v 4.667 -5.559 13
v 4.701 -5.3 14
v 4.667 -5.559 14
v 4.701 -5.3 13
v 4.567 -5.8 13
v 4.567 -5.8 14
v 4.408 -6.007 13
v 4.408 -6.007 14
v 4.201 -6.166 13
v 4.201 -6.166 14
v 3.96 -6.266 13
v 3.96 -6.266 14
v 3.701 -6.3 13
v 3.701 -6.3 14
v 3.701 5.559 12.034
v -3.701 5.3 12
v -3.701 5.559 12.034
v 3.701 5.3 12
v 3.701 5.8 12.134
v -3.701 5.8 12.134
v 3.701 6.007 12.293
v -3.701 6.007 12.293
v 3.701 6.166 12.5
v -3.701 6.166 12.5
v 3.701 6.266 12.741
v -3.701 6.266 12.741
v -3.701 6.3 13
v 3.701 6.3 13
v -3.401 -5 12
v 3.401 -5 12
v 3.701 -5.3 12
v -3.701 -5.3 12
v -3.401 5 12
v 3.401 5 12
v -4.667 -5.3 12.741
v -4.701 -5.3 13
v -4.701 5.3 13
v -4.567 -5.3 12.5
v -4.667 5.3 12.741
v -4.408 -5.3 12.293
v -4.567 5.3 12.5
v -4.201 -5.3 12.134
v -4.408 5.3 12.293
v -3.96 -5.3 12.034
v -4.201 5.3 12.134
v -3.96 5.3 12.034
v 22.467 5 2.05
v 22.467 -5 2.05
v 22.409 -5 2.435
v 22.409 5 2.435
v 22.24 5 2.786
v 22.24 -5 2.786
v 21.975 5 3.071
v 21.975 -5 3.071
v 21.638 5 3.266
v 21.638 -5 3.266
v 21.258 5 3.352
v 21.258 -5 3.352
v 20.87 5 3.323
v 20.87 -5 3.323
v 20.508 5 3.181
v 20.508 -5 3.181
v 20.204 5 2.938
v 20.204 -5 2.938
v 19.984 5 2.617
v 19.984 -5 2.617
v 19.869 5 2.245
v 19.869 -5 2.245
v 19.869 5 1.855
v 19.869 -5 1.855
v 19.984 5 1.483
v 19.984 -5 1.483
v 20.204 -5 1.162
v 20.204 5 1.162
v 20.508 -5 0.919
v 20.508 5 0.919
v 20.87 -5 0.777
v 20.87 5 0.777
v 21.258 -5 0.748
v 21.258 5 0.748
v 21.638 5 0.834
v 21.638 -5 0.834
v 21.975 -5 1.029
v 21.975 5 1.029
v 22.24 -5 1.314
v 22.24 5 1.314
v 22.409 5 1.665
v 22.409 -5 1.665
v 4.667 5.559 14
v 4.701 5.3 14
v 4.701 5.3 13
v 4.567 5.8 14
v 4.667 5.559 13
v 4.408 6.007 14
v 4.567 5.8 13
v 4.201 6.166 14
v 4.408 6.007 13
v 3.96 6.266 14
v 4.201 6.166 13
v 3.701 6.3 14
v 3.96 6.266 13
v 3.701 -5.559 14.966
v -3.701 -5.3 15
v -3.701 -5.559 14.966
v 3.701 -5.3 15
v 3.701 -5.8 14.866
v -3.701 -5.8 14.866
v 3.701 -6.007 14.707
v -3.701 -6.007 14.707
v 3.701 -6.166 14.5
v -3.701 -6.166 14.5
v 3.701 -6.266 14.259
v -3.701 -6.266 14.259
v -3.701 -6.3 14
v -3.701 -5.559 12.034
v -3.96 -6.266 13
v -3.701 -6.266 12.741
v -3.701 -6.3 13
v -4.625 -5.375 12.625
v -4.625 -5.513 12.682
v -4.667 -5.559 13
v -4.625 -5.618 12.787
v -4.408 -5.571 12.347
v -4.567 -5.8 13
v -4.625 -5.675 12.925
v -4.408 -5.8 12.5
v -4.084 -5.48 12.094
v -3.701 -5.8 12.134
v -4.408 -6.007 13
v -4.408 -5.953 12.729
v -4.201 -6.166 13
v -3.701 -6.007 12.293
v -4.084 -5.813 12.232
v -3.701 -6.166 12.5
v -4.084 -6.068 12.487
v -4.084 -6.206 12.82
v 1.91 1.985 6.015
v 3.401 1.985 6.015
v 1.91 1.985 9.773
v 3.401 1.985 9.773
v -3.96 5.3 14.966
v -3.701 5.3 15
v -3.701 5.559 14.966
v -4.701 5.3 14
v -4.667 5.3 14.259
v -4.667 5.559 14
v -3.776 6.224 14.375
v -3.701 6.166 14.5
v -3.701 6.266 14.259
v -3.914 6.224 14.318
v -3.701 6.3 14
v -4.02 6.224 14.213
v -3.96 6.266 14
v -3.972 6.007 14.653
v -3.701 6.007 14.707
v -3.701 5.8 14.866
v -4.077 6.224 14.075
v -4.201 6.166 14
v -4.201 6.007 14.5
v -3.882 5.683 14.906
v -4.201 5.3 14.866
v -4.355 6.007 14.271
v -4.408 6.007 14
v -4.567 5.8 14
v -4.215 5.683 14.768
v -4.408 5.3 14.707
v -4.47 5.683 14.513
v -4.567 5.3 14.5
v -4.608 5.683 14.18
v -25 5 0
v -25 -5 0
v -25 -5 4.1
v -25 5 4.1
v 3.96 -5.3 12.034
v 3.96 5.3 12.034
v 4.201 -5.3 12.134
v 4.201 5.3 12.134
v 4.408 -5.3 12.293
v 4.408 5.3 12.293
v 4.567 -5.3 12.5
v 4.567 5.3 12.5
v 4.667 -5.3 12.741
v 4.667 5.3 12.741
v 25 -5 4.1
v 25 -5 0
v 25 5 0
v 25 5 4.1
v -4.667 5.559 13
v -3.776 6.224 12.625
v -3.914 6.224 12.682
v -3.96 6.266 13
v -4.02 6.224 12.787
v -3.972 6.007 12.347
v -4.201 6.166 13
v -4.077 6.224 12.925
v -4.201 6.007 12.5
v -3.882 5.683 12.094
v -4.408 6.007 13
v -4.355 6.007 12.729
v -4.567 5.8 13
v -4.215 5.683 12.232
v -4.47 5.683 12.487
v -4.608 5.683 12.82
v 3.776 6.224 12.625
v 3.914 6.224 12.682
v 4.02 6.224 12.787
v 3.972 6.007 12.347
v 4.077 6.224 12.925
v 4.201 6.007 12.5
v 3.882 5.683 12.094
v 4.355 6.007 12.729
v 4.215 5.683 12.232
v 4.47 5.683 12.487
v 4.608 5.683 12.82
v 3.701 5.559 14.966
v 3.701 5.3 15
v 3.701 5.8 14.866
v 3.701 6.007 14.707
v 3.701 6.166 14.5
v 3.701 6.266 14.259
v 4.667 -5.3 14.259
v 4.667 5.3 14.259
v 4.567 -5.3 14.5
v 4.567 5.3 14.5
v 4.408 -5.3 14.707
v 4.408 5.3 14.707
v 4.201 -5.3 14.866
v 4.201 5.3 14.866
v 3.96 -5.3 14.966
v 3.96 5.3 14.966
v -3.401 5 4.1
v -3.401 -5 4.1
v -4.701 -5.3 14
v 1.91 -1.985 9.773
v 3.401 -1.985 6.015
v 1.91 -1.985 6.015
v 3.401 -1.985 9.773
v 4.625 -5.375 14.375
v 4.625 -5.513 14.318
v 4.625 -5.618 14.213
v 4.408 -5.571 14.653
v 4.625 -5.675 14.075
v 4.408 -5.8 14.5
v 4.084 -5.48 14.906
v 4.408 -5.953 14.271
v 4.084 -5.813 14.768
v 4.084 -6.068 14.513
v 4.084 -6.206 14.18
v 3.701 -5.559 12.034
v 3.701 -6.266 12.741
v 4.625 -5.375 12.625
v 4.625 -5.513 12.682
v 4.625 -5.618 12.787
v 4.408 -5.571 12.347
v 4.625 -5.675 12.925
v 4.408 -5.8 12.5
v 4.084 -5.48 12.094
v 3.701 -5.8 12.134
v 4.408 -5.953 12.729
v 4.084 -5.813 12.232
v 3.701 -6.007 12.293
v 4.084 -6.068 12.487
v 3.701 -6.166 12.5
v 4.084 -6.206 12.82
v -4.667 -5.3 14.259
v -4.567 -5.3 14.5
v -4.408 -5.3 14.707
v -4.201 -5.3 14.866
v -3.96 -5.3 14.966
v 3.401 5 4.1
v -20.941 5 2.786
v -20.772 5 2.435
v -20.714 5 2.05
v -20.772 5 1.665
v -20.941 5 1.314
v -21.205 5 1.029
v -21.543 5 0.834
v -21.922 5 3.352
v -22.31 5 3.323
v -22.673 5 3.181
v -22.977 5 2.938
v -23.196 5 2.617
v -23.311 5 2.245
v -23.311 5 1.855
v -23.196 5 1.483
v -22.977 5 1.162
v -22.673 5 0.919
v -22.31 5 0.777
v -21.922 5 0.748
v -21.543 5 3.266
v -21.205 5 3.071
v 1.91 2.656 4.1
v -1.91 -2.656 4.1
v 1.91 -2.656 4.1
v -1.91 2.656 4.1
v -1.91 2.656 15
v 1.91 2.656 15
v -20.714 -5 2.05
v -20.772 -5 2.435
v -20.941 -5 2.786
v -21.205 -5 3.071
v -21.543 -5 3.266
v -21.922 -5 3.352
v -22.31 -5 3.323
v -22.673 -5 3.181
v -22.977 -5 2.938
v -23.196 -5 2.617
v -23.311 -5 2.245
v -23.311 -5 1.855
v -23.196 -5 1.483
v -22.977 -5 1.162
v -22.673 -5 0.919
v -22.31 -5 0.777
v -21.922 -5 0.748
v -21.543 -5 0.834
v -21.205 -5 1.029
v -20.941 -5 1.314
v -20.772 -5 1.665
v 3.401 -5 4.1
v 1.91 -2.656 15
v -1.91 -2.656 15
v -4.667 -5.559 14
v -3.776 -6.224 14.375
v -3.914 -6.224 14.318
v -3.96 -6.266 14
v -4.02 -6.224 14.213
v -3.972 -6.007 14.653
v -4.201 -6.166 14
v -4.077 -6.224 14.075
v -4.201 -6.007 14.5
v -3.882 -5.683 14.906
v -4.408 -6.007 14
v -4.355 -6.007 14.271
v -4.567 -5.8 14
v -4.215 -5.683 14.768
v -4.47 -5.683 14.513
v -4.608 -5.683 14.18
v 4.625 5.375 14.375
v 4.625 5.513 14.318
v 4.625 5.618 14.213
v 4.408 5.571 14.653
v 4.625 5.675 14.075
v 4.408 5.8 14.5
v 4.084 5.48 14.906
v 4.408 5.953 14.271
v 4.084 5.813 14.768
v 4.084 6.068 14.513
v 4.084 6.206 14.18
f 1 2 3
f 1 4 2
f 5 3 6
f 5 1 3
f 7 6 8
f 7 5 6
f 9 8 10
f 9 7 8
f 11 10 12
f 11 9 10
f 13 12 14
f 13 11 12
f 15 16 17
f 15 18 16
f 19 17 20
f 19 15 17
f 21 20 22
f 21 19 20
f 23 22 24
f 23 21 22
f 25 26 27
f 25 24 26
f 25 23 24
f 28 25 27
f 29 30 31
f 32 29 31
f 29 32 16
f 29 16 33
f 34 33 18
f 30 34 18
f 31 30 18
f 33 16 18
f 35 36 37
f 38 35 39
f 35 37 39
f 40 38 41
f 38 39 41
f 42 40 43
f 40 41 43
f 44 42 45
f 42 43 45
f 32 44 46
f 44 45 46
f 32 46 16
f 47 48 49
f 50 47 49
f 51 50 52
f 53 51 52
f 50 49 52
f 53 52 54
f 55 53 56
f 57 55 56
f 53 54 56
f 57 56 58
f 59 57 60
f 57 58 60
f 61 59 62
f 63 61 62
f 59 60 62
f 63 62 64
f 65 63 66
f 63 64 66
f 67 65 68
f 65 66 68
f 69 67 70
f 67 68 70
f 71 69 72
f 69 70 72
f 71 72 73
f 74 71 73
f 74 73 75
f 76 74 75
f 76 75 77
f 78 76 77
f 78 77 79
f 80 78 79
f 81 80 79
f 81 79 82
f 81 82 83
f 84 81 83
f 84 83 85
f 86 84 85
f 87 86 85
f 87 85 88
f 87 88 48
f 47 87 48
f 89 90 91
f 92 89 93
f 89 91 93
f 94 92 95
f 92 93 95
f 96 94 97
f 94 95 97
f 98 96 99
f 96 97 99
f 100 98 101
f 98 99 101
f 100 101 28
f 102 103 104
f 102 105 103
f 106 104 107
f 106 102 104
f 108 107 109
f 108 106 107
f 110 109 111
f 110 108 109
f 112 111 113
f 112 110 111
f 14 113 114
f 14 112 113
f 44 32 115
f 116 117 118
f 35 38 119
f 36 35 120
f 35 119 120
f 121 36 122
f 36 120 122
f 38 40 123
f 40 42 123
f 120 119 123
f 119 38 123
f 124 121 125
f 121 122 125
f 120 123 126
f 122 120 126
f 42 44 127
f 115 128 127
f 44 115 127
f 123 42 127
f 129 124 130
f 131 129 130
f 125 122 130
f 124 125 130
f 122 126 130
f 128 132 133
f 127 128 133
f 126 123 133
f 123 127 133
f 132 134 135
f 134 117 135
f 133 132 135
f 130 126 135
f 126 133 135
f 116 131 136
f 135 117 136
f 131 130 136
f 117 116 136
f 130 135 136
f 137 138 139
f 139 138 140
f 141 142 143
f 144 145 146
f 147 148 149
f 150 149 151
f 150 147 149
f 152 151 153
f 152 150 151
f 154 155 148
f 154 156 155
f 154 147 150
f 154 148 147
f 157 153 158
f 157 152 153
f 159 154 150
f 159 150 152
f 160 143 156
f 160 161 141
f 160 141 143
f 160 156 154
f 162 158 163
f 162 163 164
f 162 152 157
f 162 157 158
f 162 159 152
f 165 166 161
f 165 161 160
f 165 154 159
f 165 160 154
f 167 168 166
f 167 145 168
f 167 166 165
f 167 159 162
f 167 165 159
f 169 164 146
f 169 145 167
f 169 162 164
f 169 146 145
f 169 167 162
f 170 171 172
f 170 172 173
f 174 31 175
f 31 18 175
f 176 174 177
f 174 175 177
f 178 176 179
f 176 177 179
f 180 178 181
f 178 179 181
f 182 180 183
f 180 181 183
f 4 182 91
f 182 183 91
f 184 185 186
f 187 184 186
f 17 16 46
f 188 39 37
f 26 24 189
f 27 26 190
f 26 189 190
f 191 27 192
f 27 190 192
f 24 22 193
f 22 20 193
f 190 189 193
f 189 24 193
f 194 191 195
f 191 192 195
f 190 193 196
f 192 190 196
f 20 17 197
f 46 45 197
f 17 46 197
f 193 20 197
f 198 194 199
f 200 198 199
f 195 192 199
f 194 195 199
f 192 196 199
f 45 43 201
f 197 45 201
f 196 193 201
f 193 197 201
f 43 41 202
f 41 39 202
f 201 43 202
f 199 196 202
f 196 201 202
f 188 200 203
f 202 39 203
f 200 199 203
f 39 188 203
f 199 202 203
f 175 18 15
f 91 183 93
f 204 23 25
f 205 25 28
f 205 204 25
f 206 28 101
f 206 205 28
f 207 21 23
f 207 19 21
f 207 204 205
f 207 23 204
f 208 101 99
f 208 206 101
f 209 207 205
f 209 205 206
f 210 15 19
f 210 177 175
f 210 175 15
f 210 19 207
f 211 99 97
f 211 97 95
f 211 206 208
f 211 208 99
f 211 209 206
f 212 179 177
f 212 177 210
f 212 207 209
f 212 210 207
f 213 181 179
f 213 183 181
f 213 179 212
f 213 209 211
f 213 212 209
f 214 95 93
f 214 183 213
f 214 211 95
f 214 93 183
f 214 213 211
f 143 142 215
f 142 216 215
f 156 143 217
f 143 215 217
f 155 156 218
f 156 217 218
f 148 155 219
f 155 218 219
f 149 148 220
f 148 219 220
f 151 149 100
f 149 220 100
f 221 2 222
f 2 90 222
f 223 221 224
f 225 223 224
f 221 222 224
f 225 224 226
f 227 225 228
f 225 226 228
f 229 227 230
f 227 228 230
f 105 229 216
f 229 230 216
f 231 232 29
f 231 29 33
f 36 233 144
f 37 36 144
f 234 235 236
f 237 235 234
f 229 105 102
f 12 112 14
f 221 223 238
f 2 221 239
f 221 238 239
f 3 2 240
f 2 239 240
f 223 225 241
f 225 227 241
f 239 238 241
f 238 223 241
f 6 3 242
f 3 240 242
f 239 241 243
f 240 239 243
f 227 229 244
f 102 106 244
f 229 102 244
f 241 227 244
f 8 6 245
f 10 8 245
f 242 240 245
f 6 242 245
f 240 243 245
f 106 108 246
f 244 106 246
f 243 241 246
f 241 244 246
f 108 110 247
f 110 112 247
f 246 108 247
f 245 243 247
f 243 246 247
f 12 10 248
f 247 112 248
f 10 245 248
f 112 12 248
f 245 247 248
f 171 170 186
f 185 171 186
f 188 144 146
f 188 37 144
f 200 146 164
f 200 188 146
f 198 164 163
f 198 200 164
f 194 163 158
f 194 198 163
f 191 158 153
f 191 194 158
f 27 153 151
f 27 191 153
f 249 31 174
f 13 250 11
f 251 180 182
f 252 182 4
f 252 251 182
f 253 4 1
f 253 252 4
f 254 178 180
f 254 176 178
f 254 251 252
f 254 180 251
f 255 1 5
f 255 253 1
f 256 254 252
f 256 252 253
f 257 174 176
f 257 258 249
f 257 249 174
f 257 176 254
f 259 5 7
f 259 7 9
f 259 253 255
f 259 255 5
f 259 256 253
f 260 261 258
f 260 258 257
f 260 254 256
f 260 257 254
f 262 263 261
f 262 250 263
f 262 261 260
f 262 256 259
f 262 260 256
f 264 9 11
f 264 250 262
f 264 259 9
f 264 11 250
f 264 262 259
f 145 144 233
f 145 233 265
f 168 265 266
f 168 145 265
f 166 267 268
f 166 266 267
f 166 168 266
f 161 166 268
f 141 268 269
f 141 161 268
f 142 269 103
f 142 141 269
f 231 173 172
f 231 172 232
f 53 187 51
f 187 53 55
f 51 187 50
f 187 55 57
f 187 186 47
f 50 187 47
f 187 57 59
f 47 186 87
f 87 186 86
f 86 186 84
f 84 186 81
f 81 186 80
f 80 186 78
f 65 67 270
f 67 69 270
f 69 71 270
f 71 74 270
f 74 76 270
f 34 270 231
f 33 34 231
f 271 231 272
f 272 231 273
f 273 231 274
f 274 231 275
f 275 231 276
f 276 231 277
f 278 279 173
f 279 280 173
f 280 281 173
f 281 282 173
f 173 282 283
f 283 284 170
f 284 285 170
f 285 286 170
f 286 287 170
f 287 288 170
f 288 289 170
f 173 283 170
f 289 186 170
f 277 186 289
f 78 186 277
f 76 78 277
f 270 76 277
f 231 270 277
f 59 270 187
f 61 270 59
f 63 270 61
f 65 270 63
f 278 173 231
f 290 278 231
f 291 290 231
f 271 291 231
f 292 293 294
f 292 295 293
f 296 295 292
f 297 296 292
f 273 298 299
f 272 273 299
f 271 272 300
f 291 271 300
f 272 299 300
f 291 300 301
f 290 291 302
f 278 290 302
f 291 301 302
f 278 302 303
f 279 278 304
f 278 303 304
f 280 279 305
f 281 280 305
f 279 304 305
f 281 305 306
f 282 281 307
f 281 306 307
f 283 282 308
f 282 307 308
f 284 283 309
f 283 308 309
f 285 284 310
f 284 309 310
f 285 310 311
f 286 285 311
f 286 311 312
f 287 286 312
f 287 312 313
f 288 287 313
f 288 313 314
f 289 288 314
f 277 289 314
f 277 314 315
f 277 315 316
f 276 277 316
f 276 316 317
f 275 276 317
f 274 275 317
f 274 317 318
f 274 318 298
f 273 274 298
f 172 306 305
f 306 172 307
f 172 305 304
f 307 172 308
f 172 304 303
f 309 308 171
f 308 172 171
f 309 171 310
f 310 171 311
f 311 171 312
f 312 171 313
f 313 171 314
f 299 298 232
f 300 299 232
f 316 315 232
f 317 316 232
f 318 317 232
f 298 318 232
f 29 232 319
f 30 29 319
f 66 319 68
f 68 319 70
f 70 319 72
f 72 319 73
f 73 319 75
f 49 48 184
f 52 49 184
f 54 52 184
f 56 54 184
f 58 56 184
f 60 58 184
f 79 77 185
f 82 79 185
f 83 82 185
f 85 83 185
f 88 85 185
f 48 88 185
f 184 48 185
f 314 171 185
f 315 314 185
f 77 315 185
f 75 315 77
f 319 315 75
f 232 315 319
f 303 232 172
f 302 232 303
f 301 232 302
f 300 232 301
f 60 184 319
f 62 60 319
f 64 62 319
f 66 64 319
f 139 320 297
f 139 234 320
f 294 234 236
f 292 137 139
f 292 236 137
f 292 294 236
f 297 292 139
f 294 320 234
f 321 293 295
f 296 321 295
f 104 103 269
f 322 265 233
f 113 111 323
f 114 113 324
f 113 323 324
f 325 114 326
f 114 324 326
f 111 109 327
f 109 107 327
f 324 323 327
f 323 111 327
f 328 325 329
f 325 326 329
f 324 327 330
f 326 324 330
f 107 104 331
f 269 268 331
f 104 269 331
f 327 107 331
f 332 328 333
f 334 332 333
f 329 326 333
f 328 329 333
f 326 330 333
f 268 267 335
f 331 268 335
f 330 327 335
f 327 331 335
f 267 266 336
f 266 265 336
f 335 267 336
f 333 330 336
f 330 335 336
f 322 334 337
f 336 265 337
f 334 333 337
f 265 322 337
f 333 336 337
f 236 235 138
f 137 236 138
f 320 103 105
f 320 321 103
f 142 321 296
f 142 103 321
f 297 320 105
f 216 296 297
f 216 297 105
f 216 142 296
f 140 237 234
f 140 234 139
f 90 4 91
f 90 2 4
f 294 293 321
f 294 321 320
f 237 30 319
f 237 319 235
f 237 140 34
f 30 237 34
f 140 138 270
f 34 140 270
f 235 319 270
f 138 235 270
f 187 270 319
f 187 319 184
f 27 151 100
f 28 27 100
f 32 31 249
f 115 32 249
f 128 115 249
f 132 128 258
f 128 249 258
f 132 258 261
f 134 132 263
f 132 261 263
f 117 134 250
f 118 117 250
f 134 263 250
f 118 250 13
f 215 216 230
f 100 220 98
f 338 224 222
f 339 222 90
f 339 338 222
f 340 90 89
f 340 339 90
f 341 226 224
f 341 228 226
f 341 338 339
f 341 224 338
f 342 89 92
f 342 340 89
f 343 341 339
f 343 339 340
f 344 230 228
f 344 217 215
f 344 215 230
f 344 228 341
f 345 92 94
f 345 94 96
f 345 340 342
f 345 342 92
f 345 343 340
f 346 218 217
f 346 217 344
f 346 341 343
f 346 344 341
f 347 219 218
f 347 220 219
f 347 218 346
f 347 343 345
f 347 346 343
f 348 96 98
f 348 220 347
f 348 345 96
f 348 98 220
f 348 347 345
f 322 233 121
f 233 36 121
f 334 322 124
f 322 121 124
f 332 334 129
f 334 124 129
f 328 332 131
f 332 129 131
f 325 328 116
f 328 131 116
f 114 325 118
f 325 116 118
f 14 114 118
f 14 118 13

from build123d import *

# Parameters (mm, degrees)
F0_W     = 21.598608559
F0_H     = 10
F0_W_2   = 6.802782882
F0_W_3   = 3.8192358334
F0_H_2   = 5.3111389279
F1_DEPTH = 4.1
F2_DEPTH = 15
F3_W     = 3.9702160284
F3_H     = 3.7578037009
F4_DEPTH = 1.4917735243
F5_R     = 1.3059385841
F6_DEPTH = 10.001
F7_W     = 9.4027826563
F7_H     = 12.5999997742
F7_W_2   = 6.802782882
F7_H_2   = 10
F7_W_3   = 3.8192358334
F7_H_3   = 5.3111389279
F8_DEPTH = 3
F9_R     = 1


with BuildPart() as f1:
    # F0 (on Top) → F1 (new body)
    with BuildSketch(Plane.XY):
        with Locations((-14.2006957205, 0)):
            Rectangle(F0_W, F0_H)
        with Locations((14.2006957205, 0)):
            Rectangle(F0_W, F0_H)
        Rectangle(F0_W_2, F0_H)
        Rectangle(F0_W_3, F0_H_2, mode=Mode.SUBTRACT)
        Rectangle(F0_W_3, F0_H_2)
    extrude(amount=F1_DEPTH)

    # F0 (on Top) → F2 (join)
    with BuildSketch(Plane.XY):
        Rectangle(F0_W_2, F0_H)
        Rectangle(F0_W_3, F0_H_2, mode=Mode.SUBTRACT)
    extrude(amount=F2_DEPTH)

    # F3 (on face) → F4 (cut, through all)
    with BuildSketch(Plane.YZ.offset(3.401391441)):
        with Locations((0, 7.8942701221)):
            Rectangle(F3_W, F3_H)
    extrude(amount=-F4_DEPTH, mode=Mode.SUBTRACT)

    # F5 (on face) → F6 (cut, through all)
    with BuildSketch(Plane.XZ.offset(5)):
        with Locations((-22.0196954906, 2.05)):
            Circle(F5_R)
        with Locations((21.1608465761, 2.05)):
            Circle(F5_R)
    extrude(amount=-F6_DEPTH, mode=Mode.SUBTRACT)

    # F7 (on face) → F8 (join)
    with BuildSketch(Plane.XY.offset(15)):
        Rectangle(F7_W, F7_H)
        Rectangle(F7_W_2, F7_H_2, mode=Mode.SUBTRACT)
        Rectangle(F7_W_2, F7_H_2)
        Rectangle(F7_W_3, F7_H_3, mode=Mode.SUBTRACT)
    extrude(amount=-F8_DEPTH)

    # F9
    f9_edges = [f1.edges().sort_by_distance(p)[0] for p in [
        (-4.701391, 0, 15),
        (0, -6.3, 15),
        (0, -6.3, 12),
        (4.701391, 0, 12),
        (0, 6.3, 15),
        (-4.701391, 0, 12),
        (0, 6.3, 12),
        (4.701391, 0, 15),
        (4.701391, -6.3, 13.5),
        (4.701391, 6.3, 13.5),
        (-4.701391, 6.3, 13.5),
        (-4.701391, -6.3, 13.5),
    ]]
    fillet(f9_edges, radius=F9_R)


solid = f1.part
